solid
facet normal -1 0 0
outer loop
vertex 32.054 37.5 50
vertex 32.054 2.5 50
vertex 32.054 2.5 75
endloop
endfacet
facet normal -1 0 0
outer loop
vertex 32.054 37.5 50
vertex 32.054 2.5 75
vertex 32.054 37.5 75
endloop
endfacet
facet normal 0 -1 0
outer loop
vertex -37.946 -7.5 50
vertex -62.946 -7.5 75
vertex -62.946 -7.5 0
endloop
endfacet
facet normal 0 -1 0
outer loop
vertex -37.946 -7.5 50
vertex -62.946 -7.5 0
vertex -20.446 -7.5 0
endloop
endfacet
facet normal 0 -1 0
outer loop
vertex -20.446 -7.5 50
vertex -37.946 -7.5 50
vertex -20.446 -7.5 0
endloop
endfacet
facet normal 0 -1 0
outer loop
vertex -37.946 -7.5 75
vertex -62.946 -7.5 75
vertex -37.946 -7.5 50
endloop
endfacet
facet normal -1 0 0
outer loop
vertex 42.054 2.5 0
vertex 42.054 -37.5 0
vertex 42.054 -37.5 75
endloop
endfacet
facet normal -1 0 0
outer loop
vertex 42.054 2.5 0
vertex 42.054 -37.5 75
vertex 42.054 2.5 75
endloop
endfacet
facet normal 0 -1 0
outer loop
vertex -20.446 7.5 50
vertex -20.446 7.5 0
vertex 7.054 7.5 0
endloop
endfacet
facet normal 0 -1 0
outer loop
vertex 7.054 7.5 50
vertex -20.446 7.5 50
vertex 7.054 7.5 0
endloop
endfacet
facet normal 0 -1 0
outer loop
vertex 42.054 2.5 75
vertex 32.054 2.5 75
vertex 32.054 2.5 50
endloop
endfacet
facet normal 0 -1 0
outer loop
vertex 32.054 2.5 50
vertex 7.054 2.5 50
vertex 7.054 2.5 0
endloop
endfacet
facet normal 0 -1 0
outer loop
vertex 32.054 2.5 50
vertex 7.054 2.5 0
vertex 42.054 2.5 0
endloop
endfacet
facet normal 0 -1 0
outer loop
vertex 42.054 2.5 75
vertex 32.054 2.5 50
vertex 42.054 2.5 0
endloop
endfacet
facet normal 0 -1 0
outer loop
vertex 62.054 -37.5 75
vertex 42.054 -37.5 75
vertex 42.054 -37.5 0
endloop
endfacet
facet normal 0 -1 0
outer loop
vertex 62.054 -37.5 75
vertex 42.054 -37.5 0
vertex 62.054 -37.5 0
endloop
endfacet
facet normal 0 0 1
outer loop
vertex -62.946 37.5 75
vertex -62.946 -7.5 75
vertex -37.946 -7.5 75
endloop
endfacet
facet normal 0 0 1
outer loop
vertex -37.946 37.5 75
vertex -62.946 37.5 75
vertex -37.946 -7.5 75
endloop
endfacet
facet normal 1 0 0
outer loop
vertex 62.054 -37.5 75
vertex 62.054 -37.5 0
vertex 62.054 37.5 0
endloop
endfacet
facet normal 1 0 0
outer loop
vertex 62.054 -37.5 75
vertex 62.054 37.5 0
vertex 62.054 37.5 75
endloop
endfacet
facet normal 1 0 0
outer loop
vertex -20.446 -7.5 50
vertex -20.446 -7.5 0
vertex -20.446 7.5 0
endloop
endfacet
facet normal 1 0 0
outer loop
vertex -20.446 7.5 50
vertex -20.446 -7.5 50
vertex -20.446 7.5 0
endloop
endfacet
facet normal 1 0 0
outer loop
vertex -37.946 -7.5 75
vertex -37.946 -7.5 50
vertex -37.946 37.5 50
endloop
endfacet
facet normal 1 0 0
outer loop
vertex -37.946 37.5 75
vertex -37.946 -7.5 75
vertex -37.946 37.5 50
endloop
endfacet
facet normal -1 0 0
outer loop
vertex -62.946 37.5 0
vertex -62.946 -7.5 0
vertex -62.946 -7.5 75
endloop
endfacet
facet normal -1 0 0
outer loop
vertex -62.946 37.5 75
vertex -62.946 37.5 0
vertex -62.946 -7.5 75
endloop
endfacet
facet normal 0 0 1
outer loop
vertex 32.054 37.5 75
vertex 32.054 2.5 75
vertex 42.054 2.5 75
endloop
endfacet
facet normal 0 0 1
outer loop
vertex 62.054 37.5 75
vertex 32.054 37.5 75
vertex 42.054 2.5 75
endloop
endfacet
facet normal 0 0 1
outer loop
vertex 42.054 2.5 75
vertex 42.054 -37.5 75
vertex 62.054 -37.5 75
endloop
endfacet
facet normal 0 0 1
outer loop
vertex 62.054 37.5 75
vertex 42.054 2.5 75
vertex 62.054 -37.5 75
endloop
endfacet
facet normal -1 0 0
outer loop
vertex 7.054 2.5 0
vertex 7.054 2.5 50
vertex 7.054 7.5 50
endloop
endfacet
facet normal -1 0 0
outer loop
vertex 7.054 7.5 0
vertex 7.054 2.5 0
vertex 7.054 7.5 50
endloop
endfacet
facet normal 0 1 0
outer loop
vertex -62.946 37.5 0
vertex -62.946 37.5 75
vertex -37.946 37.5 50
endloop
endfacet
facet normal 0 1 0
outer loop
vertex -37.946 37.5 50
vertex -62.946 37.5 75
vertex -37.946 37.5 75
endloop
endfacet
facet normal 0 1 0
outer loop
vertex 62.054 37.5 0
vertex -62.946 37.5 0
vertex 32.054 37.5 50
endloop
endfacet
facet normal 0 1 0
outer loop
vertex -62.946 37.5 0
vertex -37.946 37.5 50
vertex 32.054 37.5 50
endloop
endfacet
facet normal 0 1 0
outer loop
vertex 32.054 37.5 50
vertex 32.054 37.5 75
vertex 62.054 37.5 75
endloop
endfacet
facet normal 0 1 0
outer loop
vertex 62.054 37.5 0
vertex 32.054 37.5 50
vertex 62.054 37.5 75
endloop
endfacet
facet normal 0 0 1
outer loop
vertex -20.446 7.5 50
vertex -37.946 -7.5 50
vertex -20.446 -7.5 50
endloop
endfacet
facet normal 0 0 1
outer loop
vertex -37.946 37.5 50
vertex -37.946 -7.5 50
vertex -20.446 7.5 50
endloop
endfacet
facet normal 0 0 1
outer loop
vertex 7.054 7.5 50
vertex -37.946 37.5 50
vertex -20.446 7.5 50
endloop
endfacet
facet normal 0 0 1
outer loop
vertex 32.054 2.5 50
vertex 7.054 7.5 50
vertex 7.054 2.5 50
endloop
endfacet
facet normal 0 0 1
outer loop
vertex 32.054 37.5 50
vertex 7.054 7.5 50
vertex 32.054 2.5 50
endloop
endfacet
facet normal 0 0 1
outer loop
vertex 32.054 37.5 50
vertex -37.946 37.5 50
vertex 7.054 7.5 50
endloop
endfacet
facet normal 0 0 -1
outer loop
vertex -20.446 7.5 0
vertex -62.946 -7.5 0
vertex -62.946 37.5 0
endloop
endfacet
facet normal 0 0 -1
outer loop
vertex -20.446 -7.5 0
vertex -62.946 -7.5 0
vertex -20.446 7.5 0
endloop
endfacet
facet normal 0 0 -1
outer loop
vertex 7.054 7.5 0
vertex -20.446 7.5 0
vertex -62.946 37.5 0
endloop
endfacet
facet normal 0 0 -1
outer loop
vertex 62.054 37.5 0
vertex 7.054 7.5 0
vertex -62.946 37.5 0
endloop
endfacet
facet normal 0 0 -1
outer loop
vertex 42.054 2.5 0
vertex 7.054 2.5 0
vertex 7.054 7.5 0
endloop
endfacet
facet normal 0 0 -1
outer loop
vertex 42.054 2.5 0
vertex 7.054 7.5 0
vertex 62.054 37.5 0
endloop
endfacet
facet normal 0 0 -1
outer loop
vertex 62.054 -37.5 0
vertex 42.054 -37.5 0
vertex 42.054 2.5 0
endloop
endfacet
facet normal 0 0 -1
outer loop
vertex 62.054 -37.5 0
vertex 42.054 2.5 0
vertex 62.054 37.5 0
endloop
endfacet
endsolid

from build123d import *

# Parameters (mm, degrees)
F0_W     = 125
F0_H     = 75
F1_DEPTH = 37.5
F2_W     = 105
F2_H     = 30
F3_DEPTH = 75
F5_START = 50
F4_W     = 70
F4_H     = 45
F5_DEPTH = 32.67132
F6_W     = 27.5
F6_H     = 15
F7_DEPTH = 50
F8_W     = 35
F8_H     = 10
F9_DEPTH = 79.66762


with BuildPart() as f1:
    # F0 (on Front) → F1 (new body, symmetric)
    with BuildSketch(Plane.XZ):
        with Locations((-0.445794413, 37.5)):
            Rectangle(F0_W, F0_H)
    extrude(amount=F1_DEPTH, both=True)

    # F2 (on Top) → F3 (cut, symmetric)
    with BuildSketch(Plane.XY):
        with Locations((-10.445794413, -22.5)):
            Rectangle(F2_W, F2_H)
    extrude(amount=F3_DEPTH, both=True, mode=Mode.SUBTRACT)

    # F4 (on Top) → F5 (cut)
    with BuildSketch(Plane.XY.offset(F5_START)):
        with Locations((-2.945794413, 15)):
            Rectangle(F4_W, F4_H)
    extrude(amount=F5_DEPTH, mode=Mode.SUBTRACT)

    # F6 (on Top) → F7 (cut, symmetric)
    with BuildSketch(Plane.XY):
        with Locations((-6.695794413, 0)):
            Rectangle(F6_W, F6_H)
    extrude(amount=F7_DEPTH, both=True, mode=Mode.SUBTRACT)

    # F8 (on Top) → F9 (cut)
    with BuildSketch(Plane.XY):
        with Locations((24.554205587, -2.5)):
            Rectangle(F8_W, F8_H)
    extrude(amount=F9_DEPTH, mode=Mode.SUBTRACT)


solid = f1.part
